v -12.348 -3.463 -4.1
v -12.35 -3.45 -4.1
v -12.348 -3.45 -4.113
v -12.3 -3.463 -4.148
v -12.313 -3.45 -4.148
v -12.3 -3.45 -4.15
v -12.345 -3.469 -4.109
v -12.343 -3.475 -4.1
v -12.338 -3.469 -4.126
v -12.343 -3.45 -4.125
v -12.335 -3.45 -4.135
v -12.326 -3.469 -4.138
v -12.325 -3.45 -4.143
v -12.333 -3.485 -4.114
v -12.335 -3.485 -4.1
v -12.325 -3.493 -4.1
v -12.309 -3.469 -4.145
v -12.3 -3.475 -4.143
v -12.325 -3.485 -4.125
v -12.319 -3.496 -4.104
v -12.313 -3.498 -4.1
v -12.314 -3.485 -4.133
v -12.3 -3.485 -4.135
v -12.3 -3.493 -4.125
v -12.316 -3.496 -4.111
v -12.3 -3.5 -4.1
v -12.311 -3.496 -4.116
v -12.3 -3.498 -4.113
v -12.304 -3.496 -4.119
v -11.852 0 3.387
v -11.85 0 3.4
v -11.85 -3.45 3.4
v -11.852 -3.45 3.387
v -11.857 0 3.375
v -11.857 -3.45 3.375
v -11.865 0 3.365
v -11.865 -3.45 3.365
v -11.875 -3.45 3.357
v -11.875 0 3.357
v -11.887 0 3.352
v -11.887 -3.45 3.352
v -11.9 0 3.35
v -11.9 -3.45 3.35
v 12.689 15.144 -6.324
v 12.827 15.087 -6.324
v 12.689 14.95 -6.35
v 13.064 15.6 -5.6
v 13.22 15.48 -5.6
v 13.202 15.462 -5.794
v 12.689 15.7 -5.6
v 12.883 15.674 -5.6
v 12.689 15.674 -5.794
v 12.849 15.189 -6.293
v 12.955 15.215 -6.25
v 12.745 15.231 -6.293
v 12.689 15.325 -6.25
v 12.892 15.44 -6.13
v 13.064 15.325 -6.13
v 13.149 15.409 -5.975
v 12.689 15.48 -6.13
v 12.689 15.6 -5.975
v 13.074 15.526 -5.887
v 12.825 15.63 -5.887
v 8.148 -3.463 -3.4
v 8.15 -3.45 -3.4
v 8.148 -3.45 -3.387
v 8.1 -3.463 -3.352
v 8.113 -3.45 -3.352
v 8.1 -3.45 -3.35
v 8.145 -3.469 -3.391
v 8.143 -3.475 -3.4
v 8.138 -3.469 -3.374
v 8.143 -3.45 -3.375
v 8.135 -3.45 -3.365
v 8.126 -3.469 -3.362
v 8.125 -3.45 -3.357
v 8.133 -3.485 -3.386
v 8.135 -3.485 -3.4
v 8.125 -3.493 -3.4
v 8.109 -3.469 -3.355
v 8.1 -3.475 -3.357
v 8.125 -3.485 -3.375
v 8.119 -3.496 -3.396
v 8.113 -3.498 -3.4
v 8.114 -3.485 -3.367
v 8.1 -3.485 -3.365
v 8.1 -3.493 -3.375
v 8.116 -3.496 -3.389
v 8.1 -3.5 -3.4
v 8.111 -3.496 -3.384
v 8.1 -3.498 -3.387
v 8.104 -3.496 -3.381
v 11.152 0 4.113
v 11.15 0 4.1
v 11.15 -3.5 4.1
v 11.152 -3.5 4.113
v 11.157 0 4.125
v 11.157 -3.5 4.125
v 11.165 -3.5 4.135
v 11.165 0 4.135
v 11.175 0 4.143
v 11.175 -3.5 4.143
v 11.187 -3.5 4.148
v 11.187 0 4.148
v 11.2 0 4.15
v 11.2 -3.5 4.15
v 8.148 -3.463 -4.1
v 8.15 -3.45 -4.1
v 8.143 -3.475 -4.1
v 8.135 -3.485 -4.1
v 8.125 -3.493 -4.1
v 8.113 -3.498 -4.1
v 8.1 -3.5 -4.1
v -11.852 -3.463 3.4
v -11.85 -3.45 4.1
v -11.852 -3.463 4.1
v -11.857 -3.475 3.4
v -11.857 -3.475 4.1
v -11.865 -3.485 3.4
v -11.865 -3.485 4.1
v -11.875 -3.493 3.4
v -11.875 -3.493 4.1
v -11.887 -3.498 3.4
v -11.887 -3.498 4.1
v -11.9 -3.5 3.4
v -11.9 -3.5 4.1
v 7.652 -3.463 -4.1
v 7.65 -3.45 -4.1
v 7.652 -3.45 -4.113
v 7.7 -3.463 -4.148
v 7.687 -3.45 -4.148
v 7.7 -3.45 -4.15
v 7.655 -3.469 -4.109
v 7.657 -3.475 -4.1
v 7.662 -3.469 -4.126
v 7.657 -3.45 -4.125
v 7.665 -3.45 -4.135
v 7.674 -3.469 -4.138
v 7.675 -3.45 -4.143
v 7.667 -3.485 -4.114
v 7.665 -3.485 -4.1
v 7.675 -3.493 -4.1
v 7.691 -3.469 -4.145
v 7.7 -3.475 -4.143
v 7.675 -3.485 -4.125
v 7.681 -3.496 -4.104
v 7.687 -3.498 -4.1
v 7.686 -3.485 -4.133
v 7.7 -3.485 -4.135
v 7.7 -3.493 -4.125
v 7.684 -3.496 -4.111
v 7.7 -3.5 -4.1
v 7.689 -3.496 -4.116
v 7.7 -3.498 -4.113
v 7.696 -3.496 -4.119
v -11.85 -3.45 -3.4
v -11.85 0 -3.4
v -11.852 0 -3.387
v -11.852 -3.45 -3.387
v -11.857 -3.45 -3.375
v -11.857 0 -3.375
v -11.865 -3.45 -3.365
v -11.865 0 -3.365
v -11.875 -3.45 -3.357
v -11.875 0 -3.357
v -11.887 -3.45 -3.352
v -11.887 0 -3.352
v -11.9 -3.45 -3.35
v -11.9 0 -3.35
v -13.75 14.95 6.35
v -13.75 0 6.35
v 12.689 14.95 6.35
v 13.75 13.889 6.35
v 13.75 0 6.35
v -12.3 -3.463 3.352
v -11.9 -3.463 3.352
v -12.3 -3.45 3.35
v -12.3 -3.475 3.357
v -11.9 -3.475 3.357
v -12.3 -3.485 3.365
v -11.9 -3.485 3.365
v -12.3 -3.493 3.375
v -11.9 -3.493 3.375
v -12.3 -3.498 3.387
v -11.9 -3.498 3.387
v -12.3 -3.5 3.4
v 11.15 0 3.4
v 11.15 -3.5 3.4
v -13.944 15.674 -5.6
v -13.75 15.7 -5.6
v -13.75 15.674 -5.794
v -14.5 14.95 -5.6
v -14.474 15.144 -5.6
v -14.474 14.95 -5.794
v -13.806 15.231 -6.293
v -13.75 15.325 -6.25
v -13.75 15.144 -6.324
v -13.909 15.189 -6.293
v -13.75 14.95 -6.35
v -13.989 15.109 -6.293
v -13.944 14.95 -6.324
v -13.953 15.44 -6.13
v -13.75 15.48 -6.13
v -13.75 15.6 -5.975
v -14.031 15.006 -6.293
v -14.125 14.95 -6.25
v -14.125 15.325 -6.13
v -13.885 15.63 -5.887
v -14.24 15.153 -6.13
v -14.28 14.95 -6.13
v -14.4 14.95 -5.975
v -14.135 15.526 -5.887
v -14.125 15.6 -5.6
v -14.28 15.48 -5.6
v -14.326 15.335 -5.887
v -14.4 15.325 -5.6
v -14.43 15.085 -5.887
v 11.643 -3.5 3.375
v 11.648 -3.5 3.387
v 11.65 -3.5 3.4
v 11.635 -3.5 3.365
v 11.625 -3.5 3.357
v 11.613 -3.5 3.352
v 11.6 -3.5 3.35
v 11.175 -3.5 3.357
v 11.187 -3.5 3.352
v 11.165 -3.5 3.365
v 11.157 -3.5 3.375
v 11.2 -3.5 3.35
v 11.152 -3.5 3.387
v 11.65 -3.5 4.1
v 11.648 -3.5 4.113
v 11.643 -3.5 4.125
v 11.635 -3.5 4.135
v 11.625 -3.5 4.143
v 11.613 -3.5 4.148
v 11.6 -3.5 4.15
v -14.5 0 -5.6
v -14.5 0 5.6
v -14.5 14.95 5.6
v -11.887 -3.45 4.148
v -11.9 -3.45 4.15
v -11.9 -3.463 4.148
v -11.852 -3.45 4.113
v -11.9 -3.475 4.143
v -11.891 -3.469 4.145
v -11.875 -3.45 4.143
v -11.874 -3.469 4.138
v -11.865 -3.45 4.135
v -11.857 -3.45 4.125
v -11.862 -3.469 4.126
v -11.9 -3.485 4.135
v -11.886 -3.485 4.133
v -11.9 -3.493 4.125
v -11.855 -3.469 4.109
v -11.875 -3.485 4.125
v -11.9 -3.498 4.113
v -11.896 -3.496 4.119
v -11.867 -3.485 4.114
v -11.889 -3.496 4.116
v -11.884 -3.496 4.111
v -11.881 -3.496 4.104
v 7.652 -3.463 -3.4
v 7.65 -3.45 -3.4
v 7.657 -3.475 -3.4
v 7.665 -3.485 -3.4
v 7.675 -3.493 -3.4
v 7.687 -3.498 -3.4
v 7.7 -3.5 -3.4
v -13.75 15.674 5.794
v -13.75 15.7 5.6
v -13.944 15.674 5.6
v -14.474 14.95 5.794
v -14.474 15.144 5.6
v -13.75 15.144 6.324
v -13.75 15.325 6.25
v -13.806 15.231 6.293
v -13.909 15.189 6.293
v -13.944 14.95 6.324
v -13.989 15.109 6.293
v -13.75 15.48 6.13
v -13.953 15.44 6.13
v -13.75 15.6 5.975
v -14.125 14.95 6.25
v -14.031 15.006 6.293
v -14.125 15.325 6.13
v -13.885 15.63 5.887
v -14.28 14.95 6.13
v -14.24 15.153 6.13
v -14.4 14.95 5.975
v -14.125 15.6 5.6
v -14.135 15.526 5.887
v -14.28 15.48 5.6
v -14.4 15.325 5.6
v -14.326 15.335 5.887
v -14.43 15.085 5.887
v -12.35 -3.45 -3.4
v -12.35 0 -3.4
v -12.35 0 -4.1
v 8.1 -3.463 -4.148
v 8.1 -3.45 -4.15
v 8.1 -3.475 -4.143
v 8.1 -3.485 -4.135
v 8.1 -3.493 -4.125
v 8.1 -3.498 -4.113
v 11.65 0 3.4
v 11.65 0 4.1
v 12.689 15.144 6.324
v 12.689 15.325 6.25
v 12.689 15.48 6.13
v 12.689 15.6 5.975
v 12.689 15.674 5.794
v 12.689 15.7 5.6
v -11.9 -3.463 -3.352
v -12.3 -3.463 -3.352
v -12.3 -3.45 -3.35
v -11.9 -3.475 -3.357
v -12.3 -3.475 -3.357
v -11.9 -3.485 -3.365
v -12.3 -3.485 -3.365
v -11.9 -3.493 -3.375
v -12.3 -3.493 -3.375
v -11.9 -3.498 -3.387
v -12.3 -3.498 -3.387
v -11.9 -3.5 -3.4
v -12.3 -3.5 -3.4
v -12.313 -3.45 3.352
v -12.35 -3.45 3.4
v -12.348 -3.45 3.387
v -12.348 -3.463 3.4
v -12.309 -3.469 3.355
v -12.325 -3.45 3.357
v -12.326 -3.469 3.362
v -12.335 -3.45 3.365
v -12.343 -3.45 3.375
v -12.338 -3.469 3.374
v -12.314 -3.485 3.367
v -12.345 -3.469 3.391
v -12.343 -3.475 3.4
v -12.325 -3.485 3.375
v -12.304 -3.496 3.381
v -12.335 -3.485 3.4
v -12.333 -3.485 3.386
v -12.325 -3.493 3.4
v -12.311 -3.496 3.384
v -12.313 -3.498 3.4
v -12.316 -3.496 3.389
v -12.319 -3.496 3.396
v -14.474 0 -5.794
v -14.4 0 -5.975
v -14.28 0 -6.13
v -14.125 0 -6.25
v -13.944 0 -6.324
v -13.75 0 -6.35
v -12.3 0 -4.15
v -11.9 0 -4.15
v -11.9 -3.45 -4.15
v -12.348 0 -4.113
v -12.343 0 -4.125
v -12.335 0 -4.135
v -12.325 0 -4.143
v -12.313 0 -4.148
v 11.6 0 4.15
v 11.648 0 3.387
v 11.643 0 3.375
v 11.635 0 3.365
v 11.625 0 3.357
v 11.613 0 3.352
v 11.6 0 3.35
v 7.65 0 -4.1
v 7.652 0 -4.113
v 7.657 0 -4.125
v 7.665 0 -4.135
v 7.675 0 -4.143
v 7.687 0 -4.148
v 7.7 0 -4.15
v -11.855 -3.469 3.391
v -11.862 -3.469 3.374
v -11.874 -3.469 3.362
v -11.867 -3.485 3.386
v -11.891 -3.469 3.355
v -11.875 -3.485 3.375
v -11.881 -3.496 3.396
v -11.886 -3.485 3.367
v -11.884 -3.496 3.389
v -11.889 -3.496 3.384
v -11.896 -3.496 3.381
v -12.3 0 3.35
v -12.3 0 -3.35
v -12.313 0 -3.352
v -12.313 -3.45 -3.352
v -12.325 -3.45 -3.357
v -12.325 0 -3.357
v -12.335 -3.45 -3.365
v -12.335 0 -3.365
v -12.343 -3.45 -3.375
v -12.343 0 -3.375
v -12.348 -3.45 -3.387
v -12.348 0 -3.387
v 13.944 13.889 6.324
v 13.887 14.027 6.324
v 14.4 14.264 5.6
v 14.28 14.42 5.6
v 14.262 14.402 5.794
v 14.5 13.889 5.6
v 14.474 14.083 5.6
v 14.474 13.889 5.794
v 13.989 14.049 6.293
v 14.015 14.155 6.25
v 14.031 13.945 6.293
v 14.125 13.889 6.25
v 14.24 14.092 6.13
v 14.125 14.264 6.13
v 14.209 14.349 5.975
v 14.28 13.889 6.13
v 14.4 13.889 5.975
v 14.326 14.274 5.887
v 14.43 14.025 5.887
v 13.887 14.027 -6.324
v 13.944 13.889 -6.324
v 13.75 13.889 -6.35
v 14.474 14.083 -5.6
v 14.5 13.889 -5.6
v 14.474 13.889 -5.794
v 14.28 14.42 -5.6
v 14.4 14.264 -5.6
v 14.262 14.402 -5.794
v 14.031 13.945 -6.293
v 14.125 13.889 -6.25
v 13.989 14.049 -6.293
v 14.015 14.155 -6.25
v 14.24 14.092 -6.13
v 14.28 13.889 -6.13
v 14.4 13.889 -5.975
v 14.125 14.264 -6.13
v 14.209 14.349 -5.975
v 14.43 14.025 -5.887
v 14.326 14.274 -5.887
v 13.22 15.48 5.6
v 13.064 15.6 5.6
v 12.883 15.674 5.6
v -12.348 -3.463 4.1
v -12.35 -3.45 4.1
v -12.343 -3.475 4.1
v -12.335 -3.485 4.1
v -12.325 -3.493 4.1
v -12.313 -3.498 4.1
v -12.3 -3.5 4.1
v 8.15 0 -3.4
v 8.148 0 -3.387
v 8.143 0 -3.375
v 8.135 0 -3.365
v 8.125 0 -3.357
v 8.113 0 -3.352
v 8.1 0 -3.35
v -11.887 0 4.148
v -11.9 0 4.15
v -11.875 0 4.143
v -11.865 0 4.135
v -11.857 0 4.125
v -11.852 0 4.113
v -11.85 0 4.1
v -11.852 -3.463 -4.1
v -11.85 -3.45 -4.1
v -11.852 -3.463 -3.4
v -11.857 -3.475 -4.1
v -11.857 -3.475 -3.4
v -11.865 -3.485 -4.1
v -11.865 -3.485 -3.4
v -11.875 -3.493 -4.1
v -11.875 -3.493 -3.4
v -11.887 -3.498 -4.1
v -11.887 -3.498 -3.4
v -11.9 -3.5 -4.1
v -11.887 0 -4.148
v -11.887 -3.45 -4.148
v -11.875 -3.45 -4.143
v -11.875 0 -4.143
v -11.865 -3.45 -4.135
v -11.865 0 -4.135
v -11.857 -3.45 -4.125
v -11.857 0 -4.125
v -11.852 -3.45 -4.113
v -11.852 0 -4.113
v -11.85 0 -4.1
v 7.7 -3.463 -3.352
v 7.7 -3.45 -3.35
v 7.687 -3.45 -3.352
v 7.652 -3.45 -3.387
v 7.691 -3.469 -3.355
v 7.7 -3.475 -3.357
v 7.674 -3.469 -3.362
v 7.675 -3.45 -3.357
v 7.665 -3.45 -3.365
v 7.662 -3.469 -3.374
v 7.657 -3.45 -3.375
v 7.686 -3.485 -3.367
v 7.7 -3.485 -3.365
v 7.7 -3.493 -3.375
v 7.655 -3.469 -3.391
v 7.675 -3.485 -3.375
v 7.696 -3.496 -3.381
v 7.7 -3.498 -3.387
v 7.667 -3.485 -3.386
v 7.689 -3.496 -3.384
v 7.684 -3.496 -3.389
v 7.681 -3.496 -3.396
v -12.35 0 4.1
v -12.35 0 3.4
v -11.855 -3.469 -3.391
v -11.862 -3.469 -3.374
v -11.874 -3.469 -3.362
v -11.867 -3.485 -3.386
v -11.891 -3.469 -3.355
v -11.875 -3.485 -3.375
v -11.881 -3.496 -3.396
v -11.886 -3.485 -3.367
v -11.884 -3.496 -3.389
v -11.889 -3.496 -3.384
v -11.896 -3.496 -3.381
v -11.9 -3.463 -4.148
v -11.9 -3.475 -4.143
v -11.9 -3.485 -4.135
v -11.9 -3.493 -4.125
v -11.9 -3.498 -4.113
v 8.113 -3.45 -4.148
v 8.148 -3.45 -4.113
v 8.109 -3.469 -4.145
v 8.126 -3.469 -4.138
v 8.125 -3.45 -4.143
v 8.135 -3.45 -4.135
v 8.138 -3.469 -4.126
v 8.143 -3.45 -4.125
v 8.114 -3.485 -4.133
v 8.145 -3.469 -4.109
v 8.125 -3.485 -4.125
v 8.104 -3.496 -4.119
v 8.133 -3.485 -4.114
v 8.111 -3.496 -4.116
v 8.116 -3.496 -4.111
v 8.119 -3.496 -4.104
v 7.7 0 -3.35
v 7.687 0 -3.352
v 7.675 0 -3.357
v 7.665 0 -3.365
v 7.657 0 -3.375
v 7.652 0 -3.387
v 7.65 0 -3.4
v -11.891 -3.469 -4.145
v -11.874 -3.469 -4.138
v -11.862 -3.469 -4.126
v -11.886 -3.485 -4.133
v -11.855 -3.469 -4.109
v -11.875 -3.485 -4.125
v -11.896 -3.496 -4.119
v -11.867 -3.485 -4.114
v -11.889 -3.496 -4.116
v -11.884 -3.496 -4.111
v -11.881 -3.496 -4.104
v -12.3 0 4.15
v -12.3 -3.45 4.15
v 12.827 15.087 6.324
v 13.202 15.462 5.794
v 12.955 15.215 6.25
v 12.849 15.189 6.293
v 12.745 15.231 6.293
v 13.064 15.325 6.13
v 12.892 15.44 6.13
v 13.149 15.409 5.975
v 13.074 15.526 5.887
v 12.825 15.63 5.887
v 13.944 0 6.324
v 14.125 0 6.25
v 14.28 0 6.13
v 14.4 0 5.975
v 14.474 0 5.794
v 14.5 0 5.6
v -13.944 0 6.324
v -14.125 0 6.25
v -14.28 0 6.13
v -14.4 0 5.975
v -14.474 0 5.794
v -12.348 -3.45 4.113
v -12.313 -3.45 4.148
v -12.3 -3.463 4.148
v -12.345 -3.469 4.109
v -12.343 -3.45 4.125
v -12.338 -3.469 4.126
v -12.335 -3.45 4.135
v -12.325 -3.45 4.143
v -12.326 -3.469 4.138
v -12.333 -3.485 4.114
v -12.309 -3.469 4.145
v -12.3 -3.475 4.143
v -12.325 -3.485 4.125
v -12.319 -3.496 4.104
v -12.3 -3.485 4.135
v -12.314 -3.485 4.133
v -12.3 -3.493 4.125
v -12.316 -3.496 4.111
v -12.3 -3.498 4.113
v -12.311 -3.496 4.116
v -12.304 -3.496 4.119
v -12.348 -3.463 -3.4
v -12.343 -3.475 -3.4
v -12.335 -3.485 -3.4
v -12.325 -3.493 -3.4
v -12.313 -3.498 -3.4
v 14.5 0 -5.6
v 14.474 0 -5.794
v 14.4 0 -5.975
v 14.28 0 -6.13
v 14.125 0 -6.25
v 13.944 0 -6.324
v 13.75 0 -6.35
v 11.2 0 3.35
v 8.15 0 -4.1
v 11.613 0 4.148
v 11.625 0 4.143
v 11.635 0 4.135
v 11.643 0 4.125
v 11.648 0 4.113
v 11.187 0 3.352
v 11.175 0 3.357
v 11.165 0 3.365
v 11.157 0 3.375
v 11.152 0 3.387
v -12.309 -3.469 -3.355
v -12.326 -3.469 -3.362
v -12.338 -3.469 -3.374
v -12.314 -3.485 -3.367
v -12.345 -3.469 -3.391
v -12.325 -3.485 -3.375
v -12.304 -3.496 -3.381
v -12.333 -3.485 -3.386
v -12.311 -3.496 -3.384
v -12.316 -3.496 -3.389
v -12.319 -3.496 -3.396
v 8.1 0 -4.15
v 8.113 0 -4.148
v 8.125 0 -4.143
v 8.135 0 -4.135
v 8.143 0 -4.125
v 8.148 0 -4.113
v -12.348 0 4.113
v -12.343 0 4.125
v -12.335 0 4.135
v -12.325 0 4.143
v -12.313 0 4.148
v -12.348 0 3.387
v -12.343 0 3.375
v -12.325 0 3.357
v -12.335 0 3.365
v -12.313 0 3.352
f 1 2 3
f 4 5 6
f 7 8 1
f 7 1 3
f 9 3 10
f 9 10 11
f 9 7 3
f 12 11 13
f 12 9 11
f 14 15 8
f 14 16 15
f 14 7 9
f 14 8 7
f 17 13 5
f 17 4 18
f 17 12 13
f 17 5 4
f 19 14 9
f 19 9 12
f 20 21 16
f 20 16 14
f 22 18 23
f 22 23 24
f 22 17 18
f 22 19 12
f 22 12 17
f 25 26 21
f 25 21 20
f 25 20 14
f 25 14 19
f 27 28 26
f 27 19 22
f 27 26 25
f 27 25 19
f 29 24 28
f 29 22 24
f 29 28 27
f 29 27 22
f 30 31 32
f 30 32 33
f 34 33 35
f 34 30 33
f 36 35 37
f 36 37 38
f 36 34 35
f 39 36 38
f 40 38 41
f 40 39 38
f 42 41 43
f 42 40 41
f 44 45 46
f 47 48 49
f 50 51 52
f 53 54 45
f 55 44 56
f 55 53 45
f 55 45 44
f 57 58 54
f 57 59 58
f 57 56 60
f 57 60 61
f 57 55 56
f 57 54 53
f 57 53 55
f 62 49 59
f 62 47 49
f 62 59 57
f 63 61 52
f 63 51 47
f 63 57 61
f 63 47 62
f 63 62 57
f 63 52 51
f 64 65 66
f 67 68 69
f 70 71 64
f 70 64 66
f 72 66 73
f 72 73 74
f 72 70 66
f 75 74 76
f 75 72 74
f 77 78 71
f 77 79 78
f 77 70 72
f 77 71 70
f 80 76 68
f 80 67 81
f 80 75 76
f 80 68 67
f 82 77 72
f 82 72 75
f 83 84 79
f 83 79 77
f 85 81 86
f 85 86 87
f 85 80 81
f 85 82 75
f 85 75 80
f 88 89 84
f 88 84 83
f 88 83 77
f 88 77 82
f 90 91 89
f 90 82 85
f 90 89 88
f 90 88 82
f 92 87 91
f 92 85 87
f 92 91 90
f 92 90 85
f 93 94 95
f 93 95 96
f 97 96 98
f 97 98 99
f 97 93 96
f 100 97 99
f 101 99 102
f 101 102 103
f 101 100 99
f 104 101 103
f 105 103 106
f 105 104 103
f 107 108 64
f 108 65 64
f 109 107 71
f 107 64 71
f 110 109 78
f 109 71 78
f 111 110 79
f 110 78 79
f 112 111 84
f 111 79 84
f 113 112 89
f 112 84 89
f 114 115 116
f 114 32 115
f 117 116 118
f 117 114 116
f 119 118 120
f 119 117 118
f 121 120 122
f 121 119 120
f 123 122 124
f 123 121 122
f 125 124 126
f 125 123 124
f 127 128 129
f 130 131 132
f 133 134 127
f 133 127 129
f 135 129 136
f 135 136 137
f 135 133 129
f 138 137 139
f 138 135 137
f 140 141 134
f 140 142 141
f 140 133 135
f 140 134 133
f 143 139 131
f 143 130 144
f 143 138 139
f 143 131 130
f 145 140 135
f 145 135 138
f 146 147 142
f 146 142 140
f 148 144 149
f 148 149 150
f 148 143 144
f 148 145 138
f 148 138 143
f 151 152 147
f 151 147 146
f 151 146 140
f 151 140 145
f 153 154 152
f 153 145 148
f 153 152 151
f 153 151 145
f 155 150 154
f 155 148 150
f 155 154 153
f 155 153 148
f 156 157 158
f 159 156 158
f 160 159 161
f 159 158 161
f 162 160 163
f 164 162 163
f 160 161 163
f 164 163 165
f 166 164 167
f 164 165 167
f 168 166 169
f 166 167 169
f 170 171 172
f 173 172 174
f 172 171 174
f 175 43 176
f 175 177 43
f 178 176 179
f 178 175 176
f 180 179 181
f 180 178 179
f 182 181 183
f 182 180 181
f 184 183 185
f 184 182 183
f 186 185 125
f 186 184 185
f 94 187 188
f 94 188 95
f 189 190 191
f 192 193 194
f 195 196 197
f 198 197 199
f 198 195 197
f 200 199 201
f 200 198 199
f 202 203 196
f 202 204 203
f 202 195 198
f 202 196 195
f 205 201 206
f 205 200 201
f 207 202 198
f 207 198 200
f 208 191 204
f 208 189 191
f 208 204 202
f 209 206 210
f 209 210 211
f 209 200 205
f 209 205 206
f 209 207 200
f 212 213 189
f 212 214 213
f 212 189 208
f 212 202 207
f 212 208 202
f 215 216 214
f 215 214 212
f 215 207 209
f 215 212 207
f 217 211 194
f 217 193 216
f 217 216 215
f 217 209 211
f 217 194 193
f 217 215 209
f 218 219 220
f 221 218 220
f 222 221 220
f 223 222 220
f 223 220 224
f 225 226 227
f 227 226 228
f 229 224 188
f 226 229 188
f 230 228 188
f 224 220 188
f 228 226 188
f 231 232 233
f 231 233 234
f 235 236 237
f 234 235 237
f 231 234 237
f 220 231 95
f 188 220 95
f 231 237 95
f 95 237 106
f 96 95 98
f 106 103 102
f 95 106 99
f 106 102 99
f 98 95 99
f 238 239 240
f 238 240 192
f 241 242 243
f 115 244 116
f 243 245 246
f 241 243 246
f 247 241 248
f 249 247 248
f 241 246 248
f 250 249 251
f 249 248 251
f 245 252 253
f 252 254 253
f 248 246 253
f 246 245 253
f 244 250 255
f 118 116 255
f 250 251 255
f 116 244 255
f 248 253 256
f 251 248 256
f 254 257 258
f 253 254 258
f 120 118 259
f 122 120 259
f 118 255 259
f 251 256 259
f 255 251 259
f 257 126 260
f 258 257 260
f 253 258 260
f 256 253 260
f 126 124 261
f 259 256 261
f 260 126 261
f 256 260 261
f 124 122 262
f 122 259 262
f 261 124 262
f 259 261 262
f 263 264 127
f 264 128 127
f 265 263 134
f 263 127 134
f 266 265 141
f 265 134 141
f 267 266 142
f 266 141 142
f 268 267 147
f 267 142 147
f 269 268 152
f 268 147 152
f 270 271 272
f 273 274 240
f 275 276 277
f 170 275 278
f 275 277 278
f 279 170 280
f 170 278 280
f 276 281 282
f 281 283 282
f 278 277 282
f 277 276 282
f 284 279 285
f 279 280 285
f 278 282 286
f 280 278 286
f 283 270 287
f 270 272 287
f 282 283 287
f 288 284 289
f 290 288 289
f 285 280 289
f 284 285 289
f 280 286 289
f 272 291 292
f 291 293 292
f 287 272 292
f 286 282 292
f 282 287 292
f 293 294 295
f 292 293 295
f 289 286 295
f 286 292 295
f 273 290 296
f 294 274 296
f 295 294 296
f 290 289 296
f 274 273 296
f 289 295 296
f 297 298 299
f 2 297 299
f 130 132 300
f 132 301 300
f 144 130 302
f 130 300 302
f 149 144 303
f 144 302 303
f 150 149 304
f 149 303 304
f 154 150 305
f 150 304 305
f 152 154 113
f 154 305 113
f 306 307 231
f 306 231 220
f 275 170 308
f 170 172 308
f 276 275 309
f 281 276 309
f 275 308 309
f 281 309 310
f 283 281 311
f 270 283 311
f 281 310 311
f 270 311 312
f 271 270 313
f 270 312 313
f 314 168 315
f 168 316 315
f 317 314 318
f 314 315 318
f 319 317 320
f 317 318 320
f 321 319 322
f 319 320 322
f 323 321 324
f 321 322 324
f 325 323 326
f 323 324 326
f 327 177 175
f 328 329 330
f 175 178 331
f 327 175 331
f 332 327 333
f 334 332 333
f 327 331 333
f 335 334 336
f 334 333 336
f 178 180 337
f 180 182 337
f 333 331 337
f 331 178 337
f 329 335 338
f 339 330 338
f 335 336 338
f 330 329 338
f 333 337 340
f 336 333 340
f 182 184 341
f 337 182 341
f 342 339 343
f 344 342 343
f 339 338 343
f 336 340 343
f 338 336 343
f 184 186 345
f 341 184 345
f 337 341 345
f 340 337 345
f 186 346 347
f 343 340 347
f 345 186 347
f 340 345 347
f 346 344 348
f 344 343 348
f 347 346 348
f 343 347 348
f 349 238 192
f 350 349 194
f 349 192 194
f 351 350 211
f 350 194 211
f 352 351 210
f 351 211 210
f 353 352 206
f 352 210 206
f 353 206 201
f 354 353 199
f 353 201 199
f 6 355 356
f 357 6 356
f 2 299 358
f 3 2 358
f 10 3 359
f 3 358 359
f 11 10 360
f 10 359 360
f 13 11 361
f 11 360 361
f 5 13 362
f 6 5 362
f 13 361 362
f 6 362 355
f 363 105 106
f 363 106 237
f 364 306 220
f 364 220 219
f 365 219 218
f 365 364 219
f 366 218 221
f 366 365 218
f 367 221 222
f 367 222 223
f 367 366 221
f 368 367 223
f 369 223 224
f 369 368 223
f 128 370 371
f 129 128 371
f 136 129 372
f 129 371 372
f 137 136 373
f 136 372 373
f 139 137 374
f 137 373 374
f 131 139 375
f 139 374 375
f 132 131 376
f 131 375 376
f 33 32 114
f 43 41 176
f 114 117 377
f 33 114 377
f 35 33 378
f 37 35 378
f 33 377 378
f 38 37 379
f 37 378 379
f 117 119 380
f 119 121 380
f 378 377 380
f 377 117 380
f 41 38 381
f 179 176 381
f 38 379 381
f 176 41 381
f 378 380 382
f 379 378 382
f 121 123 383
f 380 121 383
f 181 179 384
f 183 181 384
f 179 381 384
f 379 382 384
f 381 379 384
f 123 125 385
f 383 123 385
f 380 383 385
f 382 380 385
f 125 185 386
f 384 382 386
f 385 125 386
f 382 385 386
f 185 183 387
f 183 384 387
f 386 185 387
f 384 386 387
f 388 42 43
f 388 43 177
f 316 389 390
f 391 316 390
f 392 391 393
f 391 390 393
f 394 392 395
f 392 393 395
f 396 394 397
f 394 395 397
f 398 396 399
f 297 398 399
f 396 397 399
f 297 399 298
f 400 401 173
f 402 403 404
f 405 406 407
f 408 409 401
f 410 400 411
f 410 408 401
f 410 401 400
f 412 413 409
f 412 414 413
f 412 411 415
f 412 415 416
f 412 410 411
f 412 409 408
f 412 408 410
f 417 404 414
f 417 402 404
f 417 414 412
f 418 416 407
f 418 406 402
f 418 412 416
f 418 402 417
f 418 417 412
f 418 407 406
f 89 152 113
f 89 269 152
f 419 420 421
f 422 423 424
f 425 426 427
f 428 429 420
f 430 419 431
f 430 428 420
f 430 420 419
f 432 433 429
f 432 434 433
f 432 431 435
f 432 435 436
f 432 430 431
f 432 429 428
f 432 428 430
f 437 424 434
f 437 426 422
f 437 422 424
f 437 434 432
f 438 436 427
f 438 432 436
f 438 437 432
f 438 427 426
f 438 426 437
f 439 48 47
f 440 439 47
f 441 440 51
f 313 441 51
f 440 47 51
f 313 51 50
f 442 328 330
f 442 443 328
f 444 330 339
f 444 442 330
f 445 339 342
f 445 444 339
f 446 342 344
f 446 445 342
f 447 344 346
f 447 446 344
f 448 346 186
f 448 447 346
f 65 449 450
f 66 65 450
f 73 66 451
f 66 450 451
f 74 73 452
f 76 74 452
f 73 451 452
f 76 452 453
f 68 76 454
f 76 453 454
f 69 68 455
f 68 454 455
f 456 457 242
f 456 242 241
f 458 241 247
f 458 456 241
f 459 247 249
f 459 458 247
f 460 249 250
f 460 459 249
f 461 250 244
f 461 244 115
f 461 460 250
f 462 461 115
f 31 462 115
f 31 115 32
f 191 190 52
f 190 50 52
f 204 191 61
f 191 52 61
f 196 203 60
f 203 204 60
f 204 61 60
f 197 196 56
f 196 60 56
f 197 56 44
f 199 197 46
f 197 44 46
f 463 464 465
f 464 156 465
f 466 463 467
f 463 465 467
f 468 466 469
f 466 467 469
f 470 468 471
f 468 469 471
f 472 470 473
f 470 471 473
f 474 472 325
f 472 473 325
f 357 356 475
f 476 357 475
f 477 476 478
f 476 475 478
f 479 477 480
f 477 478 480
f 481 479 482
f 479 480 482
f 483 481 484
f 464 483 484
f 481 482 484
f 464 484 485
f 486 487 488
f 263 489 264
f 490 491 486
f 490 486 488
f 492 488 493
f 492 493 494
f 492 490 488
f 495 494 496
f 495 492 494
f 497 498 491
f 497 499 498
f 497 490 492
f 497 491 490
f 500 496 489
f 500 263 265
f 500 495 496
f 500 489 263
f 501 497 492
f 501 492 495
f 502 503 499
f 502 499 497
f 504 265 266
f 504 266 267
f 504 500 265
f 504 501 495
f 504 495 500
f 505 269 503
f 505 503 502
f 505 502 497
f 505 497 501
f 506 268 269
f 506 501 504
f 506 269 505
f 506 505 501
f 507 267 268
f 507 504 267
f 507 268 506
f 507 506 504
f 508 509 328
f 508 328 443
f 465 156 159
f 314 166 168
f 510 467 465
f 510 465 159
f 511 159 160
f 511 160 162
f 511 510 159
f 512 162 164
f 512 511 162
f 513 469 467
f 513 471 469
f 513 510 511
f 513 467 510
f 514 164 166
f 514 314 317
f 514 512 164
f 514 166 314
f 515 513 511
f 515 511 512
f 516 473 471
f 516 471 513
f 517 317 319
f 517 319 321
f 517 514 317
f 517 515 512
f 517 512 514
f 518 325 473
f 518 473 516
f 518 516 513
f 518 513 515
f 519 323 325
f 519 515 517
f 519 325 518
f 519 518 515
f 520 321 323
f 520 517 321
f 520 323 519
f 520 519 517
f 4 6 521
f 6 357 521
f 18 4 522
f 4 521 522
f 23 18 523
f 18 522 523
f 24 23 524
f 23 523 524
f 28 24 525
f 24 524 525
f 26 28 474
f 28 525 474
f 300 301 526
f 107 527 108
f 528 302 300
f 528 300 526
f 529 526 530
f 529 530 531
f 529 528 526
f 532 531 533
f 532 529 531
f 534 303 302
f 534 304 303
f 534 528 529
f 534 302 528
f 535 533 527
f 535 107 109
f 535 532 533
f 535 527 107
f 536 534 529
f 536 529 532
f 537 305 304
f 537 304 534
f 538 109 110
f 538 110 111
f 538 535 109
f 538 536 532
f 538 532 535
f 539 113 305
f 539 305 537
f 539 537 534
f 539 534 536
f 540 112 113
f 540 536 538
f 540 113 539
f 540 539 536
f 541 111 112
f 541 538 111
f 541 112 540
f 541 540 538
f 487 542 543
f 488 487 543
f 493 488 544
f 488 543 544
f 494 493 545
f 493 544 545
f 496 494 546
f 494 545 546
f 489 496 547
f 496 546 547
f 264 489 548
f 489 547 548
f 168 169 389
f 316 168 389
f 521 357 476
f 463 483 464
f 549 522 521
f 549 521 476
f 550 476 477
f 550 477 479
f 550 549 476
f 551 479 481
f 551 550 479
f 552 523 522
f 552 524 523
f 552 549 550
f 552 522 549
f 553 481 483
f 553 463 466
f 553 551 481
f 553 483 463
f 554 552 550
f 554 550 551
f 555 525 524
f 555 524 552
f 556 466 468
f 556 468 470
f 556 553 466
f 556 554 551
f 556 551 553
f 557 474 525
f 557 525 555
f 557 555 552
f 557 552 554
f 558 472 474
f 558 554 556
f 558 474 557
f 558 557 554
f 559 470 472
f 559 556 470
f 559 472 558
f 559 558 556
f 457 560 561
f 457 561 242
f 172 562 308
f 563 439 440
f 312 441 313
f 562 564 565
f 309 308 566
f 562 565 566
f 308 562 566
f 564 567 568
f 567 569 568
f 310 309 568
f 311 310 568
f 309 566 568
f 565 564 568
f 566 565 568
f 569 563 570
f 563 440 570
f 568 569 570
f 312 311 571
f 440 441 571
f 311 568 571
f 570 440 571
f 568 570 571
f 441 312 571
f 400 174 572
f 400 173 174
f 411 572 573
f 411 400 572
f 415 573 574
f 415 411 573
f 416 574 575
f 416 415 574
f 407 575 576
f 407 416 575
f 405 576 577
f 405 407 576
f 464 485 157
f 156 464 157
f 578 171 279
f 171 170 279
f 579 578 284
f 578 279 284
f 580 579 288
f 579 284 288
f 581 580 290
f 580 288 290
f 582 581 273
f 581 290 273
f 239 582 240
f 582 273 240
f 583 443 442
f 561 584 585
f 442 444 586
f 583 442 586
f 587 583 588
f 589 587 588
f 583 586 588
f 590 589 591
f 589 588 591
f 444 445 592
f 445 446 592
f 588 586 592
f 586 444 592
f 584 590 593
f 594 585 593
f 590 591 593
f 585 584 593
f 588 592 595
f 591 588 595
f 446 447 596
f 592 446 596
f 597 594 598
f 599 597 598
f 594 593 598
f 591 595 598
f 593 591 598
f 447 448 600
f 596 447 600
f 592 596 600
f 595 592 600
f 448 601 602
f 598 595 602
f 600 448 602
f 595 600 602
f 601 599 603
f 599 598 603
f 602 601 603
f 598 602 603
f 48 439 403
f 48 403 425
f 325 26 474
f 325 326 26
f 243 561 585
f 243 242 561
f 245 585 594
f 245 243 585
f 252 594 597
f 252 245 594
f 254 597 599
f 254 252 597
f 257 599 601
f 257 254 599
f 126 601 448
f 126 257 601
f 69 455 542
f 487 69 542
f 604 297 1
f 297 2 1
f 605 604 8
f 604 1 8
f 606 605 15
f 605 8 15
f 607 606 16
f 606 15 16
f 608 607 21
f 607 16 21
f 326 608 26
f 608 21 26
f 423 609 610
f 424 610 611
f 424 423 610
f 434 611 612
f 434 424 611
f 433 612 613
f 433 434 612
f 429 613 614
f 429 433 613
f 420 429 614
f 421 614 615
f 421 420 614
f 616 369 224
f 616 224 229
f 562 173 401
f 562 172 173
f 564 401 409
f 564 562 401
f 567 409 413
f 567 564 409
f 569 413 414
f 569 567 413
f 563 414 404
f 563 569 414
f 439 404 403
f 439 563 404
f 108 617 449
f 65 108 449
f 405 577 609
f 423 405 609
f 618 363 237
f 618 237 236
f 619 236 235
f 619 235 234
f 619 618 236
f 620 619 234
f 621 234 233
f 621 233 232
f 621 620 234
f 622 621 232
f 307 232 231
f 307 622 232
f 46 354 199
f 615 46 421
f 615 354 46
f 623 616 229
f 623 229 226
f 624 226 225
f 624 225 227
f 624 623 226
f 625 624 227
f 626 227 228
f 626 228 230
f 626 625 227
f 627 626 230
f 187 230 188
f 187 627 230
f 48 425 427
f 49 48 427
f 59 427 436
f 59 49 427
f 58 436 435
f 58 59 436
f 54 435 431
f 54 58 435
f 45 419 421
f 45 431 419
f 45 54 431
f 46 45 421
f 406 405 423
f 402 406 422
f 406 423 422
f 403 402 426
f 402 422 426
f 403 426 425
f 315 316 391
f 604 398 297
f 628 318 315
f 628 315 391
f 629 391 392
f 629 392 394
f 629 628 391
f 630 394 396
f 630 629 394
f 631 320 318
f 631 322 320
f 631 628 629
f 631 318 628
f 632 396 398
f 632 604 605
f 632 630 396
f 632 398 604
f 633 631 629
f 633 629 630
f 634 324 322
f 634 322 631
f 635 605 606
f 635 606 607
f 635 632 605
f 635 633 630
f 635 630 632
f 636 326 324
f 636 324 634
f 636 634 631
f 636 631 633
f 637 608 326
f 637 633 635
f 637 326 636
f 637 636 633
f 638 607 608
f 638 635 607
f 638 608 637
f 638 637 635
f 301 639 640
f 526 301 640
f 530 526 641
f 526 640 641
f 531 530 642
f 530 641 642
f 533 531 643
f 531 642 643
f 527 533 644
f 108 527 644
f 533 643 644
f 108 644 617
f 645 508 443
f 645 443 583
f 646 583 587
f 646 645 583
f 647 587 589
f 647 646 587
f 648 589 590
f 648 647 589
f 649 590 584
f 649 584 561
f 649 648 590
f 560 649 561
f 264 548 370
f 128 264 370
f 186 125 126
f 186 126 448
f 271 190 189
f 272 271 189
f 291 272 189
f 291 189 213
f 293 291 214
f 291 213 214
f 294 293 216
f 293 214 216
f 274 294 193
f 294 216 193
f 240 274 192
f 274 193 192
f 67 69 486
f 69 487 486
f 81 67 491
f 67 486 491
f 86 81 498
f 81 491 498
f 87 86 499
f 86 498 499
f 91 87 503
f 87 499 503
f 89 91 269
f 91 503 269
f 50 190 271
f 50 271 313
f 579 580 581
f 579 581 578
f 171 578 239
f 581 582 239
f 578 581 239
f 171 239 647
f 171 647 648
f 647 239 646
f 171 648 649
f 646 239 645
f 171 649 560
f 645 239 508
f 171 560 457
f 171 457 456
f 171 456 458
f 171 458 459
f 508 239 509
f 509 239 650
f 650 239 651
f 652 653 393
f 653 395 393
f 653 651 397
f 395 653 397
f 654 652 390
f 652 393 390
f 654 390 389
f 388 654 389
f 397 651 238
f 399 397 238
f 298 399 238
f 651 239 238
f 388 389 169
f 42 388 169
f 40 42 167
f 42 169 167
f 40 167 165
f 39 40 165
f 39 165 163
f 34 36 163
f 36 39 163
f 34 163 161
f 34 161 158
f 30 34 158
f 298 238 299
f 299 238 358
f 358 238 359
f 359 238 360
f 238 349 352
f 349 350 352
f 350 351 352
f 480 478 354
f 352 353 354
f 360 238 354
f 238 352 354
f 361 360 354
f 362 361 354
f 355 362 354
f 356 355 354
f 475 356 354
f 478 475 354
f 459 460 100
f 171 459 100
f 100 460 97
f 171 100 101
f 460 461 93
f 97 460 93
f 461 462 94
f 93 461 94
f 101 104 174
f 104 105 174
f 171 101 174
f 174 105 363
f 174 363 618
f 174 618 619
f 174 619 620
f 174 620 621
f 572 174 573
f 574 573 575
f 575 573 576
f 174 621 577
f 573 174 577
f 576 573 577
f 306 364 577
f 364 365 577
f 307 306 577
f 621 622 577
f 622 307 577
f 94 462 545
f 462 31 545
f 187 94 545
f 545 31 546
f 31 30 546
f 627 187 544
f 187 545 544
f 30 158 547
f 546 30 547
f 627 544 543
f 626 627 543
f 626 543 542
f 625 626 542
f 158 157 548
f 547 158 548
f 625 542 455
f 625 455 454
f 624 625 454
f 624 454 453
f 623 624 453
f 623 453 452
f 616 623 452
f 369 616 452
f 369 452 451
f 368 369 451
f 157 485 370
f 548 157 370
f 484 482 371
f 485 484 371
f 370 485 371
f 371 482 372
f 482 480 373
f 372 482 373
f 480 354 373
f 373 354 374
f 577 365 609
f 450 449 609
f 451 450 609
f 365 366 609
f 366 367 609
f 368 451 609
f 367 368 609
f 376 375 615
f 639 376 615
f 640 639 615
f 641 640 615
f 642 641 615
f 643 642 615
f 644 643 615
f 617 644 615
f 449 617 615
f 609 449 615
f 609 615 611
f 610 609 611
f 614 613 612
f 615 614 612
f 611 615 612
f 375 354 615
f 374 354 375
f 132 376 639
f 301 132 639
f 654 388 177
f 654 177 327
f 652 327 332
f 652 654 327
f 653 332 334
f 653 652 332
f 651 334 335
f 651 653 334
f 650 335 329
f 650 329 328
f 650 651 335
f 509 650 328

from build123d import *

# Parameters (mm, degrees)
SKETCH_1_W      = 29
SKETCH_1_H      = 12.7
EXTRUDE_1_DEPTH = 15.7
EXTRUDE_2_DEPTH = 3.5
FILLET_1_R      = 0.05
CHAMFER_1_SIZE  = 1.5
FILLET_2_R      = 0.75


with BuildPart() as part:
    # Эскиз1 → Бобышка-Вытянуть1 (new body)
    with BuildSketch(Plane(origin=(0, 0, 0), x_dir=(1, 0, 0), z_dir=(0, 1, 0))):
        Rectangle(SKETCH_1_W, SKETCH_1_H)
    extrude(amount=EXTRUDE_1_DEPTH)

    # Эскиз2 → Бобышка-Вытянуть2 (add)
    with BuildSketch(Plane.XZ):
        with BuildLine():
            Line((-12.3, 4.15), (-11.9, 4.15))
            ThreePointArc((-11.9, 4.15), (-11.864644661, 4.135355339), (-11.85, 4.1))
            Line((-11.85, 4.1), (-11.85, 3.4))
            ThreePointArc((-11.85, 3.4), (-11.864644661, 3.364644661), (-11.9, 3.35))
            Line((-11.9, 3.35), (-12.3, 3.35))
            ThreePointArc((-12.3, 3.35), (-12.335355339, 3.364644661), (-12.35, 3.4))
            Line((-12.35, 3.4), (-12.35, 4.1))
            ThreePointArc((-12.35, 4.1), (-12.335355339, 4.135355339), (-12.3, 4.15))
        make_face()
        with BuildLine():
            Line((7.65, -3.4), (7.65, -4.1))
            ThreePointArc((7.65, -4.1), (7.664644661, -4.135355339), (7.7, -4.15))
            Line((7.7, -4.15), (8.1, -4.15))
            ThreePointArc((8.1, -4.15), (8.135355339, -4.135355339), (8.15, -4.1))
            Line((8.15, -4.1), (8.15, -3.4))
            ThreePointArc((8.15, -3.4), (8.135355339, -3.364644661), (8.1, -3.35))
            Line((8.1, -3.35), (7.7, -3.35))
            ThreePointArc((7.7, -3.35), (7.664644661, -3.364644661), (7.65, -3.4))
        make_face()
        with BuildLine():
            Line((-12.35, -3.4), (-12.35, -4.1))
            ThreePointArc((-12.35, -4.1), (-12.335355339, -4.135355339), (-12.3, -4.15))
            Line((-12.3, -4.15), (-11.9, -4.15))
            ThreePointArc((-11.9, -4.15), (-11.864644661, -4.135355339), (-11.85, -4.1))
            Line((-11.85, -4.1), (-11.85, -3.4))
            ThreePointArc((-11.85, -3.4), (-11.864644661, -3.364644661), (-11.9, -3.35))
            Line((-11.9, -3.35), (-12.3, -3.35))
            ThreePointArc((-12.3, -3.35), (-12.335355339, -3.364644661), (-12.35, -3.4))
        make_face()
        with BuildLine():
            Line((11.2, 4.15), (11.6, 4.15))
            ThreePointArc((11.6, 4.15), (11.635355339, 4.135355339), (11.65, 4.1))
            Line((11.65, 4.1), (11.65, 3.4))
            ThreePointArc((11.65, 3.4), (11.635355339, 3.364644661), (11.6, 3.35))
            Line((11.6, 3.35), (11.2, 3.35))
            ThreePointArc((11.2, 3.35), (11.164644661, 3.364644661), (11.15, 3.4))
            Line((11.15, 3.4), (11.15, 4.1))
            ThreePointArc((11.15, 4.1), (11.164644661, 4.135355339), (11.2, 4.15))
        make_face()
    extrude(amount=EXTRUDE_2_DEPTH)

    # Скругление1
    fillet_1_edges = [part.edges().sort_by_distance(p)[0] for p in [
        (-12.335355339, -3.5, 3.364644661),
        (-12.1, -3.5, 3.35),
        (-11.864644661, -3.5, 3.364644661),
        (-11.85, -3.5, 3.75),
        (-11.864644661, -3.5, 4.135355339),
        (-12.1, -3.5, 4.15),
        (-12.335355339, -3.5, 4.135355339),
        (-12.35, -3.5, 3.75),
        (7.664644661, -3.5, -4.135355339),
        (7.9, -3.5, -4.15),
        (8.135355339, -3.5, -4.135355339),
        (8.15, -3.5, -3.75),
        (8.135355339, -3.5, -3.364644661),
        (7.9, -3.5, -3.35),
        (7.664644661, -3.5, -3.364644661),
        (7.65, -3.5, -3.75),
        (-12.335355339, -3.5, -4.135355339),
        (-12.1, -3.5, -4.15),
        (-11.864644661, -3.5, -4.135355339),
        (-11.85, -3.5, -3.75),
        (-11.864644661, -3.5, -3.364644661),
        (-12.1, -3.5, -3.35),
        (-12.335355339, -3.5, -3.364644661),
        (-12.35, -3.5, -3.75),
    ]]
    fillet(fillet_1_edges, radius=FILLET_1_R)

    # Фаска1
    chamfer_1_edges = [part.edges().sort_by_distance(p)[0] for p in [
        (14.5, 15.7, 0),
    ]]
    chamfer(chamfer_1_edges, length=CHAMFER_1_SIZE)

    # Скругление2
    fillet_2_edges = [part.edges().sort_by_distance(p)[0] for p in [
        (-14.5, 15.7, 0),
        (-0.75, 15.7, 6.35),
        (-0.75, 15.7, -6.35),
        (13, 15.7, 0),
        (14.5, 7.1, -6.35),
        (13.75, 14.95, -6.35),
        (14.5, 7.1, 6.35),
        (14.5, 14.2, 0),
        (13.75, 14.95, 6.35),
        (-14.5, 7.85, 6.35),
        (-14.5, 7.85, -6.35),
    ]]
    fillet(fillet_2_edges, radius=FILLET_2_R)


solid = part.part
